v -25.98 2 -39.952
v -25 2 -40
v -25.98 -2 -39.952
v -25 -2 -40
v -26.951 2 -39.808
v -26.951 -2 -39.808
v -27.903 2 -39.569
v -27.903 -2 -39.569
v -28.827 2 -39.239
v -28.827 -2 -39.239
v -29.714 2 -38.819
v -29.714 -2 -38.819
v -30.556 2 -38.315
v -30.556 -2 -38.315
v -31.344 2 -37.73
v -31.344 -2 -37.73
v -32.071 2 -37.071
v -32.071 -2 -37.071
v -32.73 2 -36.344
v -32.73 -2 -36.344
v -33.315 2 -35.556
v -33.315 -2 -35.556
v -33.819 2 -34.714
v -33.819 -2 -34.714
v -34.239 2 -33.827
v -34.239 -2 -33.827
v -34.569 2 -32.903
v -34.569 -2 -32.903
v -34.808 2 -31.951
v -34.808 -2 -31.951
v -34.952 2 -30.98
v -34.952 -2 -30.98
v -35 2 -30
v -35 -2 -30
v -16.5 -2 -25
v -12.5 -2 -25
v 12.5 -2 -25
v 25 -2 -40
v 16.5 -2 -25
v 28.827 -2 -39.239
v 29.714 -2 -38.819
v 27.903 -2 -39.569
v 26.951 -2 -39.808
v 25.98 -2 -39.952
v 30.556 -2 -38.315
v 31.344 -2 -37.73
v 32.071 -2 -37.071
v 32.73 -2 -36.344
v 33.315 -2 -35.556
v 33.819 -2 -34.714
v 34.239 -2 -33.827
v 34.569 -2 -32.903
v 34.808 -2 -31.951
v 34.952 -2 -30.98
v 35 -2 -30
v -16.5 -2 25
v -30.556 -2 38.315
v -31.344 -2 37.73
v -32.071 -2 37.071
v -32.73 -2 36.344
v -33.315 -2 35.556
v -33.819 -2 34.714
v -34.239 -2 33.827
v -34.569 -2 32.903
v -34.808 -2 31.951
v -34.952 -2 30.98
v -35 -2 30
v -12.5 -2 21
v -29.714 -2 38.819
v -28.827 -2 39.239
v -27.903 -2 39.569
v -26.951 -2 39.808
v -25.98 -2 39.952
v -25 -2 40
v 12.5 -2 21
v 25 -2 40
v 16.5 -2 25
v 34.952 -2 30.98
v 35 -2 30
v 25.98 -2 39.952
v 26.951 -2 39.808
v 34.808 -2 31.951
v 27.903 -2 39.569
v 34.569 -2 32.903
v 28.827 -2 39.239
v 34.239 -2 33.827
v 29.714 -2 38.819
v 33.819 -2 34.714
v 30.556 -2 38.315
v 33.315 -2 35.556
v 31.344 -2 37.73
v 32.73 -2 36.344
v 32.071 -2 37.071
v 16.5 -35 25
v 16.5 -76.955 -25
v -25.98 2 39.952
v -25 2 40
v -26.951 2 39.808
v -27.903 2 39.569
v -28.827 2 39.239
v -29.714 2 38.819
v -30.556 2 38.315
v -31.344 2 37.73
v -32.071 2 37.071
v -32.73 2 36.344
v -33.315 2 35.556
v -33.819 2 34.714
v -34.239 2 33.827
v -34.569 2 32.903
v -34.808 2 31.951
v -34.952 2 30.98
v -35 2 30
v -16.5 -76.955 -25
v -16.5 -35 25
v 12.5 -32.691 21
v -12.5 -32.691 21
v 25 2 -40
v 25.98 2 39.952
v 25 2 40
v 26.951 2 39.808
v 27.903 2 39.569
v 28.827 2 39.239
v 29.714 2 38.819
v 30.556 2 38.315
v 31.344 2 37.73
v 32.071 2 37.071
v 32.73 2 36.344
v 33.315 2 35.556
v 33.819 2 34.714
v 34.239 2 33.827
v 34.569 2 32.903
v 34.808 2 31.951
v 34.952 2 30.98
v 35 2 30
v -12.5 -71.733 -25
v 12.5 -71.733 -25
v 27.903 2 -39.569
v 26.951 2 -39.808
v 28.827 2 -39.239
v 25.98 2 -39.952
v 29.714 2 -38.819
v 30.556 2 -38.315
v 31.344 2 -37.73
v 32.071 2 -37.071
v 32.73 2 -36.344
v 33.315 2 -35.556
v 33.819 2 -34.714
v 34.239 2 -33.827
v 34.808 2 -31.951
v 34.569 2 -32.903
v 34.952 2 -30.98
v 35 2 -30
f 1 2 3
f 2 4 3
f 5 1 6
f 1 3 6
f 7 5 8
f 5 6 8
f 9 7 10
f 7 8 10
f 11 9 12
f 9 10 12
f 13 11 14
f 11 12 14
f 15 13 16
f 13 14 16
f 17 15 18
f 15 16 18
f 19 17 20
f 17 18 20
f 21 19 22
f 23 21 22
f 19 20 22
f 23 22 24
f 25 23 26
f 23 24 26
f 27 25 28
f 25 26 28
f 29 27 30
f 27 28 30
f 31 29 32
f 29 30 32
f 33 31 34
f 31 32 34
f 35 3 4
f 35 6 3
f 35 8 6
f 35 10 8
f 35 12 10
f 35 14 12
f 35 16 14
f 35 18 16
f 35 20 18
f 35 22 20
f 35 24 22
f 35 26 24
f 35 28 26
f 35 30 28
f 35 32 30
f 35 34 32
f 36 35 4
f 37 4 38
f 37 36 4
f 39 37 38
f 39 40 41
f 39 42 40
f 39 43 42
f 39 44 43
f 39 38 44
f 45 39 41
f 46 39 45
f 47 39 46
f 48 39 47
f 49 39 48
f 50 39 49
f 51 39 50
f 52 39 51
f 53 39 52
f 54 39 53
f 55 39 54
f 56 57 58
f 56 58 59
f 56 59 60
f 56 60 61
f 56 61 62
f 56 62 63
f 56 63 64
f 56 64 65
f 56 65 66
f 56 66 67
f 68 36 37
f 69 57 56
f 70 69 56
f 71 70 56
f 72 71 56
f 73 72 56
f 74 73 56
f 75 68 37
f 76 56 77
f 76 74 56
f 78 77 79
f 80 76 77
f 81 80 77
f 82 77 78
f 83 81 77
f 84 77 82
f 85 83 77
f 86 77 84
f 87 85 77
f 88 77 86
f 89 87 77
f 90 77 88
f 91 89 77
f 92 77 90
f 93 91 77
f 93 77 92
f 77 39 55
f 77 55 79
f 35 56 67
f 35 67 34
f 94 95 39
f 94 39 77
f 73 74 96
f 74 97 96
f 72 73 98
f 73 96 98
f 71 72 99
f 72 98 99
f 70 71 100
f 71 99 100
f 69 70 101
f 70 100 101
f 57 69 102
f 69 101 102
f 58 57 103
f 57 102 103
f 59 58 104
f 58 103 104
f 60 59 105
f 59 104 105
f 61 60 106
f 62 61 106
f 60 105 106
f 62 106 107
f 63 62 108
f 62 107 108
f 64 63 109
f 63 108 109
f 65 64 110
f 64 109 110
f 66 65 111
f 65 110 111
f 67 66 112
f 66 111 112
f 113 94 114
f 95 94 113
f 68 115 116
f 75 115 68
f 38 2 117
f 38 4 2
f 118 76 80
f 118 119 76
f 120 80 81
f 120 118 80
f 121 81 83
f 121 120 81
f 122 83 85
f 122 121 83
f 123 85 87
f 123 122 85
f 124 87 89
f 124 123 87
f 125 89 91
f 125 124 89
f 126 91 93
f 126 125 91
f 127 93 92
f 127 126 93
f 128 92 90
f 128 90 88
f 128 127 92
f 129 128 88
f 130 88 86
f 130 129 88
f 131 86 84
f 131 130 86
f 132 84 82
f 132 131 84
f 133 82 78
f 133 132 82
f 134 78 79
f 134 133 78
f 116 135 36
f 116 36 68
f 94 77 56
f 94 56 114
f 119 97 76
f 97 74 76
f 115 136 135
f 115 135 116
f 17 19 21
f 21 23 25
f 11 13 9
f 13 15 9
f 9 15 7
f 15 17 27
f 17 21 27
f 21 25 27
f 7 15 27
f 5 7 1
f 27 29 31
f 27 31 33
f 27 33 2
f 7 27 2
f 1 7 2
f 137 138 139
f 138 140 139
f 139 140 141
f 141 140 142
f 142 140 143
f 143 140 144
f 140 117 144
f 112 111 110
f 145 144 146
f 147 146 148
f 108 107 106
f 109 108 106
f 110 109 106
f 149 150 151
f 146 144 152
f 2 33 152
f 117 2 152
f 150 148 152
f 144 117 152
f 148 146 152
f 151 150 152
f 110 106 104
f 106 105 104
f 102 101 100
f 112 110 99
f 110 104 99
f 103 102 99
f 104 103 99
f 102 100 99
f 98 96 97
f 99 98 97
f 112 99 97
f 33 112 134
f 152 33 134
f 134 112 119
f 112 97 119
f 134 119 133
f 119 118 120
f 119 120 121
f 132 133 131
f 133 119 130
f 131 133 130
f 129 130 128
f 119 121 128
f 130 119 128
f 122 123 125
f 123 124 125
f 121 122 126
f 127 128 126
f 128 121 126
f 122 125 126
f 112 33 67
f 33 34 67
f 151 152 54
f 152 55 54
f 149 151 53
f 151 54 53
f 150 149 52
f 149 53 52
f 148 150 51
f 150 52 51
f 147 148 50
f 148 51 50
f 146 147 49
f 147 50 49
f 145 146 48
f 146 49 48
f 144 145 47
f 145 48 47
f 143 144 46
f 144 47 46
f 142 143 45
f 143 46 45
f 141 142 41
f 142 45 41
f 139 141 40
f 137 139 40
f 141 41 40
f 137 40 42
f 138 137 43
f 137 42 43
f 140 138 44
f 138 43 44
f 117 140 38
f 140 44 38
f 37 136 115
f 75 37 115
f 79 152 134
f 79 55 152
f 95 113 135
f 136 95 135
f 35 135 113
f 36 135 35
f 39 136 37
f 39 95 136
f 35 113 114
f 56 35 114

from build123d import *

# Parameters (mm, degrees)
SKETCH_W     = 70
SKETCH_H     = 80
PAD_DEPTH    = 2
PAD001_DEPTH = 12.5
PAD002_DEPTH = 4
FILLET_R     = 10


with BuildPart() as part:
    # Sketch → Pad (new body, symmetric)
    with BuildSketch(Plane.XZ):
        Rectangle(SKETCH_W, SKETCH_H)
    extrude(amount=PAD_DEPTH, both=True)

    # Sketch001 → Pad001 (join, symmetric)
    with BuildSketch(Plane.YZ):
        Polygon((0, 25), (-35, 25), (-76.954982, -25), (-71.733352, -25), (-32.690599, 21), (0, 21), align=None)
    extrude(amount=PAD001_DEPTH, both=True)

    # Sketch002 (on Face7 of Pad001) → Pad002 (join)
    with BuildSketch(Plane(origin=(12.5, 0, 0), x_dir=(0, 0, 1), z_dir=(1, 0, 0))):
        Polygon((-25, 76.954982), (-25, 0), (25, 0), (25, 35), align=None)
    pad002 = extrude(amount=PAD002_DEPTH)

    # Mirrored: Pad002 across YZ
    add(pad002.mirror(Plane.YZ))

    # Fillet
    fillet_edges = [part.edges().sort_by_distance(p)[0] for p in [
        (35, 0, 40),
        (35, 0, -40),
        (-35, 0, 40),
        (-35, 0, -40),
    ]]
    fillet(fillet_edges, radius=FILLET_R)


solid = part.part
